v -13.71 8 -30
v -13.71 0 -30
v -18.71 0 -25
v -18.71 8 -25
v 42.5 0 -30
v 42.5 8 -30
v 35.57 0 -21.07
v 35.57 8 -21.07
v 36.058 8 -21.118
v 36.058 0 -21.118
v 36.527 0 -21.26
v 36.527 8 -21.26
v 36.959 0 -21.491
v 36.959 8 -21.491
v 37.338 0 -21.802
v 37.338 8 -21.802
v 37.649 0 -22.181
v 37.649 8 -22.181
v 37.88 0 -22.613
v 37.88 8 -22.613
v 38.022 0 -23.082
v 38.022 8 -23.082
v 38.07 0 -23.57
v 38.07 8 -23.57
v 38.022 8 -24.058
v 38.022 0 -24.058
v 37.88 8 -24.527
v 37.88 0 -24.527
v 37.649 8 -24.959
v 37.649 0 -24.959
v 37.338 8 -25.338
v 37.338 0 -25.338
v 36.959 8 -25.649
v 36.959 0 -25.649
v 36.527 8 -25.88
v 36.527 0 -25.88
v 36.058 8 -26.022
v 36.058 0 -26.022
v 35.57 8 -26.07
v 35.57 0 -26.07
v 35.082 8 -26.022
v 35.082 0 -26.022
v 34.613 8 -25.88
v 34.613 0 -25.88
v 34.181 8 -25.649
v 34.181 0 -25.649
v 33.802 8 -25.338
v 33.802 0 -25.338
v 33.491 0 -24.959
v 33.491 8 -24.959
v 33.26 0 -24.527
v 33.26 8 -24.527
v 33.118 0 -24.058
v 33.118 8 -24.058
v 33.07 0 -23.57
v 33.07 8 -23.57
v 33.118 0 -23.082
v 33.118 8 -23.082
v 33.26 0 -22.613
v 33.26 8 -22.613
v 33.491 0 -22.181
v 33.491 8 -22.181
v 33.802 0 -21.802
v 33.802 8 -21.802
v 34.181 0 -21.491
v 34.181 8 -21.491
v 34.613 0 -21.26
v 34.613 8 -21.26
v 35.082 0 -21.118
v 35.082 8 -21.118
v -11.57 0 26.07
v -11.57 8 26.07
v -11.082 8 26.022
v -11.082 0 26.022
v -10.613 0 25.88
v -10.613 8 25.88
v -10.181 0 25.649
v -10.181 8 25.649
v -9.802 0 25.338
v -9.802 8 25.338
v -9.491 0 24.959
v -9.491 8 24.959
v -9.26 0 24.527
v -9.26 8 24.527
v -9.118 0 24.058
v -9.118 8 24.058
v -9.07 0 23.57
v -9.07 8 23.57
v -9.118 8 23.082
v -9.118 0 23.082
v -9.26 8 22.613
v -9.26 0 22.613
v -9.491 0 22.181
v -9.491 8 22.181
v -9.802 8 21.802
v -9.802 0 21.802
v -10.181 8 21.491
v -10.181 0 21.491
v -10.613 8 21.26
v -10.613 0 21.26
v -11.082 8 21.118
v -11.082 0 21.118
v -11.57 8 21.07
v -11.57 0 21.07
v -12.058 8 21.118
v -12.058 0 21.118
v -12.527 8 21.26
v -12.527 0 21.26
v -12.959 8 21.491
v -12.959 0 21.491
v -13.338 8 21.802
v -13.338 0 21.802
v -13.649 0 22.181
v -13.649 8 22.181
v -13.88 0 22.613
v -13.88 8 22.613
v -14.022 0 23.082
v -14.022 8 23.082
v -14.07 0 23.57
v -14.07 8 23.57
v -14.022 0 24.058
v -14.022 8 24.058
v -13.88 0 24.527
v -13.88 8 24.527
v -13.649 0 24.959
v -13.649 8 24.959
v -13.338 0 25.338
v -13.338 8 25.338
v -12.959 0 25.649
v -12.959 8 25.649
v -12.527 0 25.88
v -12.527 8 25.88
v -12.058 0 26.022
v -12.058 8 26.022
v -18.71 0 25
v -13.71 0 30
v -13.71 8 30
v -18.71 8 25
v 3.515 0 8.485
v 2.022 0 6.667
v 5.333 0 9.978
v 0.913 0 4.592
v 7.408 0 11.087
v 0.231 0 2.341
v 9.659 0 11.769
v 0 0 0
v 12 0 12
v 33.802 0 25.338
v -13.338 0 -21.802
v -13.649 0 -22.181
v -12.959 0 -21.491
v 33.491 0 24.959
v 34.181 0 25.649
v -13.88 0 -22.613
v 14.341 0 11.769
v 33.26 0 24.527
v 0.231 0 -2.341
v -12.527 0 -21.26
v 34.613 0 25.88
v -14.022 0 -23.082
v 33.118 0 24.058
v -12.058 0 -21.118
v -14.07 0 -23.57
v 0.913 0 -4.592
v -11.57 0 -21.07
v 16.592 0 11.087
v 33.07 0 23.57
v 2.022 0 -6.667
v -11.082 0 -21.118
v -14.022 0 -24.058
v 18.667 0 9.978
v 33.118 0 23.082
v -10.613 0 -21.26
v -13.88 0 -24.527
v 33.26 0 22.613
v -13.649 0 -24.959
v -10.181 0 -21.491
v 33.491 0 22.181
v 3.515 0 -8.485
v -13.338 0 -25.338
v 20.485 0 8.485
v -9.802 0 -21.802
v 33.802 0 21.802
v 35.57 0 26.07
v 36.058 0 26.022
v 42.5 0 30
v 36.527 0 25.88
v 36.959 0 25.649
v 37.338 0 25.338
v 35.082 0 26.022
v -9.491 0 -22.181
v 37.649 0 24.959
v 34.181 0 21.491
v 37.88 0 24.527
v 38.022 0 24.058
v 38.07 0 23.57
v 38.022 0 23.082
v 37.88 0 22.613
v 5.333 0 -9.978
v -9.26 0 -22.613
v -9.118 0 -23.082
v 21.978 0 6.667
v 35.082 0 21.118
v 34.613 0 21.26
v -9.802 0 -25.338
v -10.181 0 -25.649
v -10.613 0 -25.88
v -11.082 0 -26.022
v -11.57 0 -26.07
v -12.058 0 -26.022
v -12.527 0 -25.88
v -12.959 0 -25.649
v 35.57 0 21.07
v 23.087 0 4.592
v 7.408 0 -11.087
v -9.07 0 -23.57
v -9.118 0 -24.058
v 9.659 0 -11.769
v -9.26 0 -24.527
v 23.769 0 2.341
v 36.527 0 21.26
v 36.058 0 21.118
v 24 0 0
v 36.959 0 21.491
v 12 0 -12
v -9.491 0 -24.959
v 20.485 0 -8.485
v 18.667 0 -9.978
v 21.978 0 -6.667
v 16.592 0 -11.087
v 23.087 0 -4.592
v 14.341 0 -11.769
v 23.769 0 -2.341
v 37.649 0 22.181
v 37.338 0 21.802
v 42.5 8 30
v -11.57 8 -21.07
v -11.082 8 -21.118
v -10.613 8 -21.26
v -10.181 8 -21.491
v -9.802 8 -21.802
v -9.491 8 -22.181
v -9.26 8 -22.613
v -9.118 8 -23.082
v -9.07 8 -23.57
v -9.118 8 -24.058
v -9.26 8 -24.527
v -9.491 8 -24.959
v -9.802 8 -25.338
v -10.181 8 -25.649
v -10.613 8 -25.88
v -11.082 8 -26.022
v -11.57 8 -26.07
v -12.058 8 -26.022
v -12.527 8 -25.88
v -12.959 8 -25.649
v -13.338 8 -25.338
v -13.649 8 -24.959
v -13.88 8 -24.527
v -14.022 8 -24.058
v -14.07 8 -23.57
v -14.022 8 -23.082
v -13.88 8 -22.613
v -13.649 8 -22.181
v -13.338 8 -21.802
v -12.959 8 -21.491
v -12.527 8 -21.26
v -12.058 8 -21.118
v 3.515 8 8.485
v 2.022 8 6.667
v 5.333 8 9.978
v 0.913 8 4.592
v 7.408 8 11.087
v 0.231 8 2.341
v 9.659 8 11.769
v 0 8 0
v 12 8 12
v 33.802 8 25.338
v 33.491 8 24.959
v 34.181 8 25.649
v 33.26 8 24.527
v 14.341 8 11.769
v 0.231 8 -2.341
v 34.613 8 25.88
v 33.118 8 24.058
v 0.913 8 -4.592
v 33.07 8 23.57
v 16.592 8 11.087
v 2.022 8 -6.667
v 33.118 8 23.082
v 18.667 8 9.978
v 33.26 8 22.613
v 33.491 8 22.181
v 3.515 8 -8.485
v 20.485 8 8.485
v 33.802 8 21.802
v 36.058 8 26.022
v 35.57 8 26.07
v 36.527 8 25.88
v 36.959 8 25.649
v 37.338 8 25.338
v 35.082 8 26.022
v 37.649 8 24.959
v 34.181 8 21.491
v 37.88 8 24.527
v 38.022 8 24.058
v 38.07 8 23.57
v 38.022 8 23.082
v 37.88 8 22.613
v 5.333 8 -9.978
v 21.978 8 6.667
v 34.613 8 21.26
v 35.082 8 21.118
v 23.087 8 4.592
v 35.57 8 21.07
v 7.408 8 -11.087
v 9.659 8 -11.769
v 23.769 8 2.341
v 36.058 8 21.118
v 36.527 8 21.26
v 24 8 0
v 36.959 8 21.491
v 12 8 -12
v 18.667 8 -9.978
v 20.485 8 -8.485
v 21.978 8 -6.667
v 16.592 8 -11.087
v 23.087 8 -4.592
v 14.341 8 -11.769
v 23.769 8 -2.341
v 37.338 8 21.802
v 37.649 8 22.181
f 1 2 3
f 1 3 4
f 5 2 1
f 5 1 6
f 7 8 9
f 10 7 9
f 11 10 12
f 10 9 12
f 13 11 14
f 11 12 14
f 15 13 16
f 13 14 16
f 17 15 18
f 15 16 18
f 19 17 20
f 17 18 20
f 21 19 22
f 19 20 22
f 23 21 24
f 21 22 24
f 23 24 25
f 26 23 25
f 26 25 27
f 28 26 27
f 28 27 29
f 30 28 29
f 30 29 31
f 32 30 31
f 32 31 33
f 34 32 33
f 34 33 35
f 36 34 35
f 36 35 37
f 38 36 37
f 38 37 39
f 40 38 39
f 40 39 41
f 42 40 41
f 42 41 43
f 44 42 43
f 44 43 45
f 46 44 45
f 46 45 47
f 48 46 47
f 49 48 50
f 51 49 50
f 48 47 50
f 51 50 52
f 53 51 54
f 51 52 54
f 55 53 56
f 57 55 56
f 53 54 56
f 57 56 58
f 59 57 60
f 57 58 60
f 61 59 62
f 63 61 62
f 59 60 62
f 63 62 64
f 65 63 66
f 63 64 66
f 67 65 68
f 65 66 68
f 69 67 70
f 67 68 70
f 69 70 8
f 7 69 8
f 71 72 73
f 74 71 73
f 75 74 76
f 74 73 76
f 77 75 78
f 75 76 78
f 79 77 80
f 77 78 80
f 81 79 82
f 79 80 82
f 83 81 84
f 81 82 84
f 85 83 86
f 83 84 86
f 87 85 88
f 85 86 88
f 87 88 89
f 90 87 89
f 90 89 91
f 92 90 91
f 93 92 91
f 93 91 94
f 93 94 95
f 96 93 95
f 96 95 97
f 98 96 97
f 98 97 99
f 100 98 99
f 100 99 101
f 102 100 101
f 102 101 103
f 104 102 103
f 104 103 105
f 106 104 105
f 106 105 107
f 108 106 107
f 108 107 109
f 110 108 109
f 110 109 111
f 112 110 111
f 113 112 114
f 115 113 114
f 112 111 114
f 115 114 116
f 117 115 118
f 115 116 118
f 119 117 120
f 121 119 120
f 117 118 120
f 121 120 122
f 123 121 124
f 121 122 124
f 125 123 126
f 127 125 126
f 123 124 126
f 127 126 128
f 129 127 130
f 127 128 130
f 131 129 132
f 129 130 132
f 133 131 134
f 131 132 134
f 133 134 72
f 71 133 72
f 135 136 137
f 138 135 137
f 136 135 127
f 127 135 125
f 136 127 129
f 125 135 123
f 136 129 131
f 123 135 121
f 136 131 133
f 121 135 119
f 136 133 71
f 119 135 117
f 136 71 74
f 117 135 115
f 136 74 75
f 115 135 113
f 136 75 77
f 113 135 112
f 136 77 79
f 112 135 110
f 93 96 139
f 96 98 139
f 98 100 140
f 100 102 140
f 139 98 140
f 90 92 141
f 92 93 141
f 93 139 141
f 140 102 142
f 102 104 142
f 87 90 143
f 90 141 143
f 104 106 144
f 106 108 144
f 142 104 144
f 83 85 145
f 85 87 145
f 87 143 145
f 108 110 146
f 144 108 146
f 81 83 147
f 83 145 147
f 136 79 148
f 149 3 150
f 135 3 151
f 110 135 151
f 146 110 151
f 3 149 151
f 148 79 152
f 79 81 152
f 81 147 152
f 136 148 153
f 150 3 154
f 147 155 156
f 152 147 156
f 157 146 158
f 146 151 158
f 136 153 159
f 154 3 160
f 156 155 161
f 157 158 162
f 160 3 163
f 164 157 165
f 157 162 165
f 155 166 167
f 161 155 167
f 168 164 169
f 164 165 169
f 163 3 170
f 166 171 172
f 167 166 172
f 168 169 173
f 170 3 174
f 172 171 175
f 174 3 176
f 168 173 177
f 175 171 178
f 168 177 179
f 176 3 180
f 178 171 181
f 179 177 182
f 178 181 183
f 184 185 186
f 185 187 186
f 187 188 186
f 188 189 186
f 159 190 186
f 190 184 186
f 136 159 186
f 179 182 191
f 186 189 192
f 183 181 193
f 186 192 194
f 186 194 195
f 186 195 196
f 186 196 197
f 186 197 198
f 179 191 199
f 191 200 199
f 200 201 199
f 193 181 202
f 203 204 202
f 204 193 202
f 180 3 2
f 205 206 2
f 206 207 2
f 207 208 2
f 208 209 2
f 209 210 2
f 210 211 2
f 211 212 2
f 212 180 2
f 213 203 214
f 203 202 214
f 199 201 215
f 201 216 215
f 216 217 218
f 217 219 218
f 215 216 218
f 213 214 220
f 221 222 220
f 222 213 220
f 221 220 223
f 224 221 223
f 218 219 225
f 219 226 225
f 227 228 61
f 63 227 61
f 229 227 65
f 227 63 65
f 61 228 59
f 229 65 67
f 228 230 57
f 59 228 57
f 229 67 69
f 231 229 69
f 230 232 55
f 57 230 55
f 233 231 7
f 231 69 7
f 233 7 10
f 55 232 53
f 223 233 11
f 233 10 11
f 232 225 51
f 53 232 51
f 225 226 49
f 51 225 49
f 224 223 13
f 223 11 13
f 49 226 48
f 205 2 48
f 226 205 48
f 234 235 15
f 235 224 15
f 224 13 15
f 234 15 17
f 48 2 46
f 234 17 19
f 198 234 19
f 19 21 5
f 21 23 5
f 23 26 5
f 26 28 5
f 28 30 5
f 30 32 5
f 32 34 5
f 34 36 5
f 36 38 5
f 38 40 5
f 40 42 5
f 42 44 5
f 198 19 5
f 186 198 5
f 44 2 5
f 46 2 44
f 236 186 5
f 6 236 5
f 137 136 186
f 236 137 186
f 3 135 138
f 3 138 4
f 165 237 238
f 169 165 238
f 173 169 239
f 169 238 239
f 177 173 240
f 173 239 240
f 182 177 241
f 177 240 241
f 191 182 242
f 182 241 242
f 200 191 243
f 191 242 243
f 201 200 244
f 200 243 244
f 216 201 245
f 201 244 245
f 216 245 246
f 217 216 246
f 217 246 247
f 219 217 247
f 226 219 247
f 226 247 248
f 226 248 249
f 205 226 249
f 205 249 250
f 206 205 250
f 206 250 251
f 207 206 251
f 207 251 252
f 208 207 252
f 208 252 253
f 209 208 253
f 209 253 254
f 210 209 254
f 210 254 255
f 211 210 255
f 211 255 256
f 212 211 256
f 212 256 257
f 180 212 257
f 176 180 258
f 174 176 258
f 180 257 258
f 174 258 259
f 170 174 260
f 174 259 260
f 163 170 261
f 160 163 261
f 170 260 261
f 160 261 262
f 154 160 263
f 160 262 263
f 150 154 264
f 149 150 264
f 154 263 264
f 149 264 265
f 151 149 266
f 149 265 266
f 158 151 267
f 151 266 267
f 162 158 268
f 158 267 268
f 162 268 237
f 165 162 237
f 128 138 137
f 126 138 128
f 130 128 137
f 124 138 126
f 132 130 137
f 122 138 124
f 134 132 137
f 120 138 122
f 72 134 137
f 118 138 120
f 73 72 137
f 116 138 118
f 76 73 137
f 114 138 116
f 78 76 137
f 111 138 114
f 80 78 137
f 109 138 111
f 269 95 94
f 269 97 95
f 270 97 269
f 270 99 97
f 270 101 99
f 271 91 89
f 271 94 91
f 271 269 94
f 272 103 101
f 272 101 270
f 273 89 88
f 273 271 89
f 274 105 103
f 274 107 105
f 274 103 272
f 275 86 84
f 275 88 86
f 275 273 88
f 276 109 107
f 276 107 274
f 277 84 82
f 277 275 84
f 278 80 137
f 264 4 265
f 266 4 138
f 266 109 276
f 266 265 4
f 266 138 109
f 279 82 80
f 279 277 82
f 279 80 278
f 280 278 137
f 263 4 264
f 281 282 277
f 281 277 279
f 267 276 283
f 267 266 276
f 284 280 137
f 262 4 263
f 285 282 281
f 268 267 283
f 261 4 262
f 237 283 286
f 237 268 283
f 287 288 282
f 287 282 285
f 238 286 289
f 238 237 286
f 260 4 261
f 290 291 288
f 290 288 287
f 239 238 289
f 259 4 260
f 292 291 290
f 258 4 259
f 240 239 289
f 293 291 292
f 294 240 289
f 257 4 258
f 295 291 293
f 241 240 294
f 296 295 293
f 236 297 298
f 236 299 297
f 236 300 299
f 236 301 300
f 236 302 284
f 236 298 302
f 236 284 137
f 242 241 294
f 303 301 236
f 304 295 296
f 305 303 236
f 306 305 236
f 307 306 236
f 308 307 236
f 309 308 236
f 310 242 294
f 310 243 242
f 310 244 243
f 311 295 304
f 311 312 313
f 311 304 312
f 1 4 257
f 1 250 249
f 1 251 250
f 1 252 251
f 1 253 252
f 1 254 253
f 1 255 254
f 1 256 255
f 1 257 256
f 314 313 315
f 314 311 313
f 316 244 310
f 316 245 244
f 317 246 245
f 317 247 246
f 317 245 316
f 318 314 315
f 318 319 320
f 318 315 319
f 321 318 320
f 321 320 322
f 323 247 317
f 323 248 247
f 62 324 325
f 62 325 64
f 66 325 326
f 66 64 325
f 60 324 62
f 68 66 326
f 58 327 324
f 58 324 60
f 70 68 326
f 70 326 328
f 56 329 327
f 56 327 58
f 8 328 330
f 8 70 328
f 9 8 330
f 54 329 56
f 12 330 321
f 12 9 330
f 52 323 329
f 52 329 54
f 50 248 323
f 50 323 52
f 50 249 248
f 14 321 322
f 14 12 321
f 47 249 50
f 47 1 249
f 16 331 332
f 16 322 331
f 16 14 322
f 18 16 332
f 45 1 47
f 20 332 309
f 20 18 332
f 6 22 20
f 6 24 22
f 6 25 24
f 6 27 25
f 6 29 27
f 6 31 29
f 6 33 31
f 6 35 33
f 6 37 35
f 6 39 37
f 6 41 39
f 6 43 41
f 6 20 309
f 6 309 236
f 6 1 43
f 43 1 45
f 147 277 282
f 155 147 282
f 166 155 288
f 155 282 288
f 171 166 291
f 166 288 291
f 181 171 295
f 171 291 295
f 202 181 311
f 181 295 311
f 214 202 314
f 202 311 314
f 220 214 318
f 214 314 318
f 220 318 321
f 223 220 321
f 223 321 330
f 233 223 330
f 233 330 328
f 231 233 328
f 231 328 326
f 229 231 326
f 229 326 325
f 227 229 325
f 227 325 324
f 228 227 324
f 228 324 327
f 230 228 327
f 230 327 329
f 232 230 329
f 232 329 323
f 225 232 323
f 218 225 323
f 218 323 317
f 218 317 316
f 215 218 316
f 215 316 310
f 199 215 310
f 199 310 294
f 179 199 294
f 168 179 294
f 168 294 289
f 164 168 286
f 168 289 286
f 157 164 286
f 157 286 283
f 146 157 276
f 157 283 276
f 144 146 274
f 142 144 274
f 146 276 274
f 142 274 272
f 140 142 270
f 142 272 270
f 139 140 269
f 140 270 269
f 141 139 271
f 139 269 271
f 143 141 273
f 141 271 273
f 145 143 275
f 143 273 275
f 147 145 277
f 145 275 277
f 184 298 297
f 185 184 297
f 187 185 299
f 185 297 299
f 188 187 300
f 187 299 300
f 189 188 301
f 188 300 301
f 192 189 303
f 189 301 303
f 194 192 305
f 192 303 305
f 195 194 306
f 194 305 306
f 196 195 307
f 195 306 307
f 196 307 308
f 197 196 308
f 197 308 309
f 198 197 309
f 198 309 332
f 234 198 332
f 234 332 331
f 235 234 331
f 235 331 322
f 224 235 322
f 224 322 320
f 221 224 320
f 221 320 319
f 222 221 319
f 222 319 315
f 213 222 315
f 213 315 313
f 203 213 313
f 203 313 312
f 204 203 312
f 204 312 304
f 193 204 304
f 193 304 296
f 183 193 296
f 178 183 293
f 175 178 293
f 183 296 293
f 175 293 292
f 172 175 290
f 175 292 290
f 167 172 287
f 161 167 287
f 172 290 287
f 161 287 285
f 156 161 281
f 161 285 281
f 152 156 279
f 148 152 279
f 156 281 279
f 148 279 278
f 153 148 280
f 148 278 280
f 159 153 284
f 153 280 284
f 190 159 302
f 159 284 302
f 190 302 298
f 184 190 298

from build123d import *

# Parameters (mm, degrees)
SKETCH2_W          = 61.210230612
SKETCH2_H          = 60
EXTRUDE1_DEPTH     = 8
CHAMFER1_SIZE      = 5
SKETCH3_R          = 12
SKETCH3_R_2        = 2.5
CUT_EXTRUDE1_DEPTH = 53.63316445


with BuildPart() as part:
    # Sketch2 → Extrude1 (new body)
    with BuildSketch(Plane(origin=(0, 0, 0), x_dir=(1, 0, 0), z_dir=(0, 1, 0))):
        with Locations((11.894884694, 0)):
            Rectangle(SKETCH2_W, SKETCH2_H)
    extrude(amount=EXTRUDE1_DEPTH)

    # Chamfer1
    chamfer1_edges = [part.edges().sort_by_distance(p)[0] for p in [
        (-18.710230612, 4, 30),
        (-18.710230612, 4, -30),
    ]]
    chamfer(chamfer1_edges, length=CHAMFER1_SIZE)

    # Sketch3 → Cut-Extrude1 (cut, through all)
    with BuildSketch(Plane(origin=(0, 8, 0), x_dir=(1, 0, 0), z_dir=(0, 1, 0))):
        with Locations(Location((12, 0, 0), (0, 0, 270))):
            Circle(SKETCH3_R)
        with Locations(Location((-11.57, 23.57, 0), (0, 0, 270))):
            Circle(SKETCH3_R_2)
        with Locations(Location((35.57, 23.57, 0), (0, 0, 270))):
            Circle(SKETCH3_R_2)
        with Locations(Location((-11.57, -23.57, 0), (0, 0, 270))):
            Circle(SKETCH3_R_2)
        with Locations(Location((35.57, -23.57, 0), (0, 0, 270))):
            Circle(SKETCH3_R_2)
    extrude(amount=-CUT_EXTRUDE1_DEPTH, mode=Mode.SUBTRACT)


solid = part.part
